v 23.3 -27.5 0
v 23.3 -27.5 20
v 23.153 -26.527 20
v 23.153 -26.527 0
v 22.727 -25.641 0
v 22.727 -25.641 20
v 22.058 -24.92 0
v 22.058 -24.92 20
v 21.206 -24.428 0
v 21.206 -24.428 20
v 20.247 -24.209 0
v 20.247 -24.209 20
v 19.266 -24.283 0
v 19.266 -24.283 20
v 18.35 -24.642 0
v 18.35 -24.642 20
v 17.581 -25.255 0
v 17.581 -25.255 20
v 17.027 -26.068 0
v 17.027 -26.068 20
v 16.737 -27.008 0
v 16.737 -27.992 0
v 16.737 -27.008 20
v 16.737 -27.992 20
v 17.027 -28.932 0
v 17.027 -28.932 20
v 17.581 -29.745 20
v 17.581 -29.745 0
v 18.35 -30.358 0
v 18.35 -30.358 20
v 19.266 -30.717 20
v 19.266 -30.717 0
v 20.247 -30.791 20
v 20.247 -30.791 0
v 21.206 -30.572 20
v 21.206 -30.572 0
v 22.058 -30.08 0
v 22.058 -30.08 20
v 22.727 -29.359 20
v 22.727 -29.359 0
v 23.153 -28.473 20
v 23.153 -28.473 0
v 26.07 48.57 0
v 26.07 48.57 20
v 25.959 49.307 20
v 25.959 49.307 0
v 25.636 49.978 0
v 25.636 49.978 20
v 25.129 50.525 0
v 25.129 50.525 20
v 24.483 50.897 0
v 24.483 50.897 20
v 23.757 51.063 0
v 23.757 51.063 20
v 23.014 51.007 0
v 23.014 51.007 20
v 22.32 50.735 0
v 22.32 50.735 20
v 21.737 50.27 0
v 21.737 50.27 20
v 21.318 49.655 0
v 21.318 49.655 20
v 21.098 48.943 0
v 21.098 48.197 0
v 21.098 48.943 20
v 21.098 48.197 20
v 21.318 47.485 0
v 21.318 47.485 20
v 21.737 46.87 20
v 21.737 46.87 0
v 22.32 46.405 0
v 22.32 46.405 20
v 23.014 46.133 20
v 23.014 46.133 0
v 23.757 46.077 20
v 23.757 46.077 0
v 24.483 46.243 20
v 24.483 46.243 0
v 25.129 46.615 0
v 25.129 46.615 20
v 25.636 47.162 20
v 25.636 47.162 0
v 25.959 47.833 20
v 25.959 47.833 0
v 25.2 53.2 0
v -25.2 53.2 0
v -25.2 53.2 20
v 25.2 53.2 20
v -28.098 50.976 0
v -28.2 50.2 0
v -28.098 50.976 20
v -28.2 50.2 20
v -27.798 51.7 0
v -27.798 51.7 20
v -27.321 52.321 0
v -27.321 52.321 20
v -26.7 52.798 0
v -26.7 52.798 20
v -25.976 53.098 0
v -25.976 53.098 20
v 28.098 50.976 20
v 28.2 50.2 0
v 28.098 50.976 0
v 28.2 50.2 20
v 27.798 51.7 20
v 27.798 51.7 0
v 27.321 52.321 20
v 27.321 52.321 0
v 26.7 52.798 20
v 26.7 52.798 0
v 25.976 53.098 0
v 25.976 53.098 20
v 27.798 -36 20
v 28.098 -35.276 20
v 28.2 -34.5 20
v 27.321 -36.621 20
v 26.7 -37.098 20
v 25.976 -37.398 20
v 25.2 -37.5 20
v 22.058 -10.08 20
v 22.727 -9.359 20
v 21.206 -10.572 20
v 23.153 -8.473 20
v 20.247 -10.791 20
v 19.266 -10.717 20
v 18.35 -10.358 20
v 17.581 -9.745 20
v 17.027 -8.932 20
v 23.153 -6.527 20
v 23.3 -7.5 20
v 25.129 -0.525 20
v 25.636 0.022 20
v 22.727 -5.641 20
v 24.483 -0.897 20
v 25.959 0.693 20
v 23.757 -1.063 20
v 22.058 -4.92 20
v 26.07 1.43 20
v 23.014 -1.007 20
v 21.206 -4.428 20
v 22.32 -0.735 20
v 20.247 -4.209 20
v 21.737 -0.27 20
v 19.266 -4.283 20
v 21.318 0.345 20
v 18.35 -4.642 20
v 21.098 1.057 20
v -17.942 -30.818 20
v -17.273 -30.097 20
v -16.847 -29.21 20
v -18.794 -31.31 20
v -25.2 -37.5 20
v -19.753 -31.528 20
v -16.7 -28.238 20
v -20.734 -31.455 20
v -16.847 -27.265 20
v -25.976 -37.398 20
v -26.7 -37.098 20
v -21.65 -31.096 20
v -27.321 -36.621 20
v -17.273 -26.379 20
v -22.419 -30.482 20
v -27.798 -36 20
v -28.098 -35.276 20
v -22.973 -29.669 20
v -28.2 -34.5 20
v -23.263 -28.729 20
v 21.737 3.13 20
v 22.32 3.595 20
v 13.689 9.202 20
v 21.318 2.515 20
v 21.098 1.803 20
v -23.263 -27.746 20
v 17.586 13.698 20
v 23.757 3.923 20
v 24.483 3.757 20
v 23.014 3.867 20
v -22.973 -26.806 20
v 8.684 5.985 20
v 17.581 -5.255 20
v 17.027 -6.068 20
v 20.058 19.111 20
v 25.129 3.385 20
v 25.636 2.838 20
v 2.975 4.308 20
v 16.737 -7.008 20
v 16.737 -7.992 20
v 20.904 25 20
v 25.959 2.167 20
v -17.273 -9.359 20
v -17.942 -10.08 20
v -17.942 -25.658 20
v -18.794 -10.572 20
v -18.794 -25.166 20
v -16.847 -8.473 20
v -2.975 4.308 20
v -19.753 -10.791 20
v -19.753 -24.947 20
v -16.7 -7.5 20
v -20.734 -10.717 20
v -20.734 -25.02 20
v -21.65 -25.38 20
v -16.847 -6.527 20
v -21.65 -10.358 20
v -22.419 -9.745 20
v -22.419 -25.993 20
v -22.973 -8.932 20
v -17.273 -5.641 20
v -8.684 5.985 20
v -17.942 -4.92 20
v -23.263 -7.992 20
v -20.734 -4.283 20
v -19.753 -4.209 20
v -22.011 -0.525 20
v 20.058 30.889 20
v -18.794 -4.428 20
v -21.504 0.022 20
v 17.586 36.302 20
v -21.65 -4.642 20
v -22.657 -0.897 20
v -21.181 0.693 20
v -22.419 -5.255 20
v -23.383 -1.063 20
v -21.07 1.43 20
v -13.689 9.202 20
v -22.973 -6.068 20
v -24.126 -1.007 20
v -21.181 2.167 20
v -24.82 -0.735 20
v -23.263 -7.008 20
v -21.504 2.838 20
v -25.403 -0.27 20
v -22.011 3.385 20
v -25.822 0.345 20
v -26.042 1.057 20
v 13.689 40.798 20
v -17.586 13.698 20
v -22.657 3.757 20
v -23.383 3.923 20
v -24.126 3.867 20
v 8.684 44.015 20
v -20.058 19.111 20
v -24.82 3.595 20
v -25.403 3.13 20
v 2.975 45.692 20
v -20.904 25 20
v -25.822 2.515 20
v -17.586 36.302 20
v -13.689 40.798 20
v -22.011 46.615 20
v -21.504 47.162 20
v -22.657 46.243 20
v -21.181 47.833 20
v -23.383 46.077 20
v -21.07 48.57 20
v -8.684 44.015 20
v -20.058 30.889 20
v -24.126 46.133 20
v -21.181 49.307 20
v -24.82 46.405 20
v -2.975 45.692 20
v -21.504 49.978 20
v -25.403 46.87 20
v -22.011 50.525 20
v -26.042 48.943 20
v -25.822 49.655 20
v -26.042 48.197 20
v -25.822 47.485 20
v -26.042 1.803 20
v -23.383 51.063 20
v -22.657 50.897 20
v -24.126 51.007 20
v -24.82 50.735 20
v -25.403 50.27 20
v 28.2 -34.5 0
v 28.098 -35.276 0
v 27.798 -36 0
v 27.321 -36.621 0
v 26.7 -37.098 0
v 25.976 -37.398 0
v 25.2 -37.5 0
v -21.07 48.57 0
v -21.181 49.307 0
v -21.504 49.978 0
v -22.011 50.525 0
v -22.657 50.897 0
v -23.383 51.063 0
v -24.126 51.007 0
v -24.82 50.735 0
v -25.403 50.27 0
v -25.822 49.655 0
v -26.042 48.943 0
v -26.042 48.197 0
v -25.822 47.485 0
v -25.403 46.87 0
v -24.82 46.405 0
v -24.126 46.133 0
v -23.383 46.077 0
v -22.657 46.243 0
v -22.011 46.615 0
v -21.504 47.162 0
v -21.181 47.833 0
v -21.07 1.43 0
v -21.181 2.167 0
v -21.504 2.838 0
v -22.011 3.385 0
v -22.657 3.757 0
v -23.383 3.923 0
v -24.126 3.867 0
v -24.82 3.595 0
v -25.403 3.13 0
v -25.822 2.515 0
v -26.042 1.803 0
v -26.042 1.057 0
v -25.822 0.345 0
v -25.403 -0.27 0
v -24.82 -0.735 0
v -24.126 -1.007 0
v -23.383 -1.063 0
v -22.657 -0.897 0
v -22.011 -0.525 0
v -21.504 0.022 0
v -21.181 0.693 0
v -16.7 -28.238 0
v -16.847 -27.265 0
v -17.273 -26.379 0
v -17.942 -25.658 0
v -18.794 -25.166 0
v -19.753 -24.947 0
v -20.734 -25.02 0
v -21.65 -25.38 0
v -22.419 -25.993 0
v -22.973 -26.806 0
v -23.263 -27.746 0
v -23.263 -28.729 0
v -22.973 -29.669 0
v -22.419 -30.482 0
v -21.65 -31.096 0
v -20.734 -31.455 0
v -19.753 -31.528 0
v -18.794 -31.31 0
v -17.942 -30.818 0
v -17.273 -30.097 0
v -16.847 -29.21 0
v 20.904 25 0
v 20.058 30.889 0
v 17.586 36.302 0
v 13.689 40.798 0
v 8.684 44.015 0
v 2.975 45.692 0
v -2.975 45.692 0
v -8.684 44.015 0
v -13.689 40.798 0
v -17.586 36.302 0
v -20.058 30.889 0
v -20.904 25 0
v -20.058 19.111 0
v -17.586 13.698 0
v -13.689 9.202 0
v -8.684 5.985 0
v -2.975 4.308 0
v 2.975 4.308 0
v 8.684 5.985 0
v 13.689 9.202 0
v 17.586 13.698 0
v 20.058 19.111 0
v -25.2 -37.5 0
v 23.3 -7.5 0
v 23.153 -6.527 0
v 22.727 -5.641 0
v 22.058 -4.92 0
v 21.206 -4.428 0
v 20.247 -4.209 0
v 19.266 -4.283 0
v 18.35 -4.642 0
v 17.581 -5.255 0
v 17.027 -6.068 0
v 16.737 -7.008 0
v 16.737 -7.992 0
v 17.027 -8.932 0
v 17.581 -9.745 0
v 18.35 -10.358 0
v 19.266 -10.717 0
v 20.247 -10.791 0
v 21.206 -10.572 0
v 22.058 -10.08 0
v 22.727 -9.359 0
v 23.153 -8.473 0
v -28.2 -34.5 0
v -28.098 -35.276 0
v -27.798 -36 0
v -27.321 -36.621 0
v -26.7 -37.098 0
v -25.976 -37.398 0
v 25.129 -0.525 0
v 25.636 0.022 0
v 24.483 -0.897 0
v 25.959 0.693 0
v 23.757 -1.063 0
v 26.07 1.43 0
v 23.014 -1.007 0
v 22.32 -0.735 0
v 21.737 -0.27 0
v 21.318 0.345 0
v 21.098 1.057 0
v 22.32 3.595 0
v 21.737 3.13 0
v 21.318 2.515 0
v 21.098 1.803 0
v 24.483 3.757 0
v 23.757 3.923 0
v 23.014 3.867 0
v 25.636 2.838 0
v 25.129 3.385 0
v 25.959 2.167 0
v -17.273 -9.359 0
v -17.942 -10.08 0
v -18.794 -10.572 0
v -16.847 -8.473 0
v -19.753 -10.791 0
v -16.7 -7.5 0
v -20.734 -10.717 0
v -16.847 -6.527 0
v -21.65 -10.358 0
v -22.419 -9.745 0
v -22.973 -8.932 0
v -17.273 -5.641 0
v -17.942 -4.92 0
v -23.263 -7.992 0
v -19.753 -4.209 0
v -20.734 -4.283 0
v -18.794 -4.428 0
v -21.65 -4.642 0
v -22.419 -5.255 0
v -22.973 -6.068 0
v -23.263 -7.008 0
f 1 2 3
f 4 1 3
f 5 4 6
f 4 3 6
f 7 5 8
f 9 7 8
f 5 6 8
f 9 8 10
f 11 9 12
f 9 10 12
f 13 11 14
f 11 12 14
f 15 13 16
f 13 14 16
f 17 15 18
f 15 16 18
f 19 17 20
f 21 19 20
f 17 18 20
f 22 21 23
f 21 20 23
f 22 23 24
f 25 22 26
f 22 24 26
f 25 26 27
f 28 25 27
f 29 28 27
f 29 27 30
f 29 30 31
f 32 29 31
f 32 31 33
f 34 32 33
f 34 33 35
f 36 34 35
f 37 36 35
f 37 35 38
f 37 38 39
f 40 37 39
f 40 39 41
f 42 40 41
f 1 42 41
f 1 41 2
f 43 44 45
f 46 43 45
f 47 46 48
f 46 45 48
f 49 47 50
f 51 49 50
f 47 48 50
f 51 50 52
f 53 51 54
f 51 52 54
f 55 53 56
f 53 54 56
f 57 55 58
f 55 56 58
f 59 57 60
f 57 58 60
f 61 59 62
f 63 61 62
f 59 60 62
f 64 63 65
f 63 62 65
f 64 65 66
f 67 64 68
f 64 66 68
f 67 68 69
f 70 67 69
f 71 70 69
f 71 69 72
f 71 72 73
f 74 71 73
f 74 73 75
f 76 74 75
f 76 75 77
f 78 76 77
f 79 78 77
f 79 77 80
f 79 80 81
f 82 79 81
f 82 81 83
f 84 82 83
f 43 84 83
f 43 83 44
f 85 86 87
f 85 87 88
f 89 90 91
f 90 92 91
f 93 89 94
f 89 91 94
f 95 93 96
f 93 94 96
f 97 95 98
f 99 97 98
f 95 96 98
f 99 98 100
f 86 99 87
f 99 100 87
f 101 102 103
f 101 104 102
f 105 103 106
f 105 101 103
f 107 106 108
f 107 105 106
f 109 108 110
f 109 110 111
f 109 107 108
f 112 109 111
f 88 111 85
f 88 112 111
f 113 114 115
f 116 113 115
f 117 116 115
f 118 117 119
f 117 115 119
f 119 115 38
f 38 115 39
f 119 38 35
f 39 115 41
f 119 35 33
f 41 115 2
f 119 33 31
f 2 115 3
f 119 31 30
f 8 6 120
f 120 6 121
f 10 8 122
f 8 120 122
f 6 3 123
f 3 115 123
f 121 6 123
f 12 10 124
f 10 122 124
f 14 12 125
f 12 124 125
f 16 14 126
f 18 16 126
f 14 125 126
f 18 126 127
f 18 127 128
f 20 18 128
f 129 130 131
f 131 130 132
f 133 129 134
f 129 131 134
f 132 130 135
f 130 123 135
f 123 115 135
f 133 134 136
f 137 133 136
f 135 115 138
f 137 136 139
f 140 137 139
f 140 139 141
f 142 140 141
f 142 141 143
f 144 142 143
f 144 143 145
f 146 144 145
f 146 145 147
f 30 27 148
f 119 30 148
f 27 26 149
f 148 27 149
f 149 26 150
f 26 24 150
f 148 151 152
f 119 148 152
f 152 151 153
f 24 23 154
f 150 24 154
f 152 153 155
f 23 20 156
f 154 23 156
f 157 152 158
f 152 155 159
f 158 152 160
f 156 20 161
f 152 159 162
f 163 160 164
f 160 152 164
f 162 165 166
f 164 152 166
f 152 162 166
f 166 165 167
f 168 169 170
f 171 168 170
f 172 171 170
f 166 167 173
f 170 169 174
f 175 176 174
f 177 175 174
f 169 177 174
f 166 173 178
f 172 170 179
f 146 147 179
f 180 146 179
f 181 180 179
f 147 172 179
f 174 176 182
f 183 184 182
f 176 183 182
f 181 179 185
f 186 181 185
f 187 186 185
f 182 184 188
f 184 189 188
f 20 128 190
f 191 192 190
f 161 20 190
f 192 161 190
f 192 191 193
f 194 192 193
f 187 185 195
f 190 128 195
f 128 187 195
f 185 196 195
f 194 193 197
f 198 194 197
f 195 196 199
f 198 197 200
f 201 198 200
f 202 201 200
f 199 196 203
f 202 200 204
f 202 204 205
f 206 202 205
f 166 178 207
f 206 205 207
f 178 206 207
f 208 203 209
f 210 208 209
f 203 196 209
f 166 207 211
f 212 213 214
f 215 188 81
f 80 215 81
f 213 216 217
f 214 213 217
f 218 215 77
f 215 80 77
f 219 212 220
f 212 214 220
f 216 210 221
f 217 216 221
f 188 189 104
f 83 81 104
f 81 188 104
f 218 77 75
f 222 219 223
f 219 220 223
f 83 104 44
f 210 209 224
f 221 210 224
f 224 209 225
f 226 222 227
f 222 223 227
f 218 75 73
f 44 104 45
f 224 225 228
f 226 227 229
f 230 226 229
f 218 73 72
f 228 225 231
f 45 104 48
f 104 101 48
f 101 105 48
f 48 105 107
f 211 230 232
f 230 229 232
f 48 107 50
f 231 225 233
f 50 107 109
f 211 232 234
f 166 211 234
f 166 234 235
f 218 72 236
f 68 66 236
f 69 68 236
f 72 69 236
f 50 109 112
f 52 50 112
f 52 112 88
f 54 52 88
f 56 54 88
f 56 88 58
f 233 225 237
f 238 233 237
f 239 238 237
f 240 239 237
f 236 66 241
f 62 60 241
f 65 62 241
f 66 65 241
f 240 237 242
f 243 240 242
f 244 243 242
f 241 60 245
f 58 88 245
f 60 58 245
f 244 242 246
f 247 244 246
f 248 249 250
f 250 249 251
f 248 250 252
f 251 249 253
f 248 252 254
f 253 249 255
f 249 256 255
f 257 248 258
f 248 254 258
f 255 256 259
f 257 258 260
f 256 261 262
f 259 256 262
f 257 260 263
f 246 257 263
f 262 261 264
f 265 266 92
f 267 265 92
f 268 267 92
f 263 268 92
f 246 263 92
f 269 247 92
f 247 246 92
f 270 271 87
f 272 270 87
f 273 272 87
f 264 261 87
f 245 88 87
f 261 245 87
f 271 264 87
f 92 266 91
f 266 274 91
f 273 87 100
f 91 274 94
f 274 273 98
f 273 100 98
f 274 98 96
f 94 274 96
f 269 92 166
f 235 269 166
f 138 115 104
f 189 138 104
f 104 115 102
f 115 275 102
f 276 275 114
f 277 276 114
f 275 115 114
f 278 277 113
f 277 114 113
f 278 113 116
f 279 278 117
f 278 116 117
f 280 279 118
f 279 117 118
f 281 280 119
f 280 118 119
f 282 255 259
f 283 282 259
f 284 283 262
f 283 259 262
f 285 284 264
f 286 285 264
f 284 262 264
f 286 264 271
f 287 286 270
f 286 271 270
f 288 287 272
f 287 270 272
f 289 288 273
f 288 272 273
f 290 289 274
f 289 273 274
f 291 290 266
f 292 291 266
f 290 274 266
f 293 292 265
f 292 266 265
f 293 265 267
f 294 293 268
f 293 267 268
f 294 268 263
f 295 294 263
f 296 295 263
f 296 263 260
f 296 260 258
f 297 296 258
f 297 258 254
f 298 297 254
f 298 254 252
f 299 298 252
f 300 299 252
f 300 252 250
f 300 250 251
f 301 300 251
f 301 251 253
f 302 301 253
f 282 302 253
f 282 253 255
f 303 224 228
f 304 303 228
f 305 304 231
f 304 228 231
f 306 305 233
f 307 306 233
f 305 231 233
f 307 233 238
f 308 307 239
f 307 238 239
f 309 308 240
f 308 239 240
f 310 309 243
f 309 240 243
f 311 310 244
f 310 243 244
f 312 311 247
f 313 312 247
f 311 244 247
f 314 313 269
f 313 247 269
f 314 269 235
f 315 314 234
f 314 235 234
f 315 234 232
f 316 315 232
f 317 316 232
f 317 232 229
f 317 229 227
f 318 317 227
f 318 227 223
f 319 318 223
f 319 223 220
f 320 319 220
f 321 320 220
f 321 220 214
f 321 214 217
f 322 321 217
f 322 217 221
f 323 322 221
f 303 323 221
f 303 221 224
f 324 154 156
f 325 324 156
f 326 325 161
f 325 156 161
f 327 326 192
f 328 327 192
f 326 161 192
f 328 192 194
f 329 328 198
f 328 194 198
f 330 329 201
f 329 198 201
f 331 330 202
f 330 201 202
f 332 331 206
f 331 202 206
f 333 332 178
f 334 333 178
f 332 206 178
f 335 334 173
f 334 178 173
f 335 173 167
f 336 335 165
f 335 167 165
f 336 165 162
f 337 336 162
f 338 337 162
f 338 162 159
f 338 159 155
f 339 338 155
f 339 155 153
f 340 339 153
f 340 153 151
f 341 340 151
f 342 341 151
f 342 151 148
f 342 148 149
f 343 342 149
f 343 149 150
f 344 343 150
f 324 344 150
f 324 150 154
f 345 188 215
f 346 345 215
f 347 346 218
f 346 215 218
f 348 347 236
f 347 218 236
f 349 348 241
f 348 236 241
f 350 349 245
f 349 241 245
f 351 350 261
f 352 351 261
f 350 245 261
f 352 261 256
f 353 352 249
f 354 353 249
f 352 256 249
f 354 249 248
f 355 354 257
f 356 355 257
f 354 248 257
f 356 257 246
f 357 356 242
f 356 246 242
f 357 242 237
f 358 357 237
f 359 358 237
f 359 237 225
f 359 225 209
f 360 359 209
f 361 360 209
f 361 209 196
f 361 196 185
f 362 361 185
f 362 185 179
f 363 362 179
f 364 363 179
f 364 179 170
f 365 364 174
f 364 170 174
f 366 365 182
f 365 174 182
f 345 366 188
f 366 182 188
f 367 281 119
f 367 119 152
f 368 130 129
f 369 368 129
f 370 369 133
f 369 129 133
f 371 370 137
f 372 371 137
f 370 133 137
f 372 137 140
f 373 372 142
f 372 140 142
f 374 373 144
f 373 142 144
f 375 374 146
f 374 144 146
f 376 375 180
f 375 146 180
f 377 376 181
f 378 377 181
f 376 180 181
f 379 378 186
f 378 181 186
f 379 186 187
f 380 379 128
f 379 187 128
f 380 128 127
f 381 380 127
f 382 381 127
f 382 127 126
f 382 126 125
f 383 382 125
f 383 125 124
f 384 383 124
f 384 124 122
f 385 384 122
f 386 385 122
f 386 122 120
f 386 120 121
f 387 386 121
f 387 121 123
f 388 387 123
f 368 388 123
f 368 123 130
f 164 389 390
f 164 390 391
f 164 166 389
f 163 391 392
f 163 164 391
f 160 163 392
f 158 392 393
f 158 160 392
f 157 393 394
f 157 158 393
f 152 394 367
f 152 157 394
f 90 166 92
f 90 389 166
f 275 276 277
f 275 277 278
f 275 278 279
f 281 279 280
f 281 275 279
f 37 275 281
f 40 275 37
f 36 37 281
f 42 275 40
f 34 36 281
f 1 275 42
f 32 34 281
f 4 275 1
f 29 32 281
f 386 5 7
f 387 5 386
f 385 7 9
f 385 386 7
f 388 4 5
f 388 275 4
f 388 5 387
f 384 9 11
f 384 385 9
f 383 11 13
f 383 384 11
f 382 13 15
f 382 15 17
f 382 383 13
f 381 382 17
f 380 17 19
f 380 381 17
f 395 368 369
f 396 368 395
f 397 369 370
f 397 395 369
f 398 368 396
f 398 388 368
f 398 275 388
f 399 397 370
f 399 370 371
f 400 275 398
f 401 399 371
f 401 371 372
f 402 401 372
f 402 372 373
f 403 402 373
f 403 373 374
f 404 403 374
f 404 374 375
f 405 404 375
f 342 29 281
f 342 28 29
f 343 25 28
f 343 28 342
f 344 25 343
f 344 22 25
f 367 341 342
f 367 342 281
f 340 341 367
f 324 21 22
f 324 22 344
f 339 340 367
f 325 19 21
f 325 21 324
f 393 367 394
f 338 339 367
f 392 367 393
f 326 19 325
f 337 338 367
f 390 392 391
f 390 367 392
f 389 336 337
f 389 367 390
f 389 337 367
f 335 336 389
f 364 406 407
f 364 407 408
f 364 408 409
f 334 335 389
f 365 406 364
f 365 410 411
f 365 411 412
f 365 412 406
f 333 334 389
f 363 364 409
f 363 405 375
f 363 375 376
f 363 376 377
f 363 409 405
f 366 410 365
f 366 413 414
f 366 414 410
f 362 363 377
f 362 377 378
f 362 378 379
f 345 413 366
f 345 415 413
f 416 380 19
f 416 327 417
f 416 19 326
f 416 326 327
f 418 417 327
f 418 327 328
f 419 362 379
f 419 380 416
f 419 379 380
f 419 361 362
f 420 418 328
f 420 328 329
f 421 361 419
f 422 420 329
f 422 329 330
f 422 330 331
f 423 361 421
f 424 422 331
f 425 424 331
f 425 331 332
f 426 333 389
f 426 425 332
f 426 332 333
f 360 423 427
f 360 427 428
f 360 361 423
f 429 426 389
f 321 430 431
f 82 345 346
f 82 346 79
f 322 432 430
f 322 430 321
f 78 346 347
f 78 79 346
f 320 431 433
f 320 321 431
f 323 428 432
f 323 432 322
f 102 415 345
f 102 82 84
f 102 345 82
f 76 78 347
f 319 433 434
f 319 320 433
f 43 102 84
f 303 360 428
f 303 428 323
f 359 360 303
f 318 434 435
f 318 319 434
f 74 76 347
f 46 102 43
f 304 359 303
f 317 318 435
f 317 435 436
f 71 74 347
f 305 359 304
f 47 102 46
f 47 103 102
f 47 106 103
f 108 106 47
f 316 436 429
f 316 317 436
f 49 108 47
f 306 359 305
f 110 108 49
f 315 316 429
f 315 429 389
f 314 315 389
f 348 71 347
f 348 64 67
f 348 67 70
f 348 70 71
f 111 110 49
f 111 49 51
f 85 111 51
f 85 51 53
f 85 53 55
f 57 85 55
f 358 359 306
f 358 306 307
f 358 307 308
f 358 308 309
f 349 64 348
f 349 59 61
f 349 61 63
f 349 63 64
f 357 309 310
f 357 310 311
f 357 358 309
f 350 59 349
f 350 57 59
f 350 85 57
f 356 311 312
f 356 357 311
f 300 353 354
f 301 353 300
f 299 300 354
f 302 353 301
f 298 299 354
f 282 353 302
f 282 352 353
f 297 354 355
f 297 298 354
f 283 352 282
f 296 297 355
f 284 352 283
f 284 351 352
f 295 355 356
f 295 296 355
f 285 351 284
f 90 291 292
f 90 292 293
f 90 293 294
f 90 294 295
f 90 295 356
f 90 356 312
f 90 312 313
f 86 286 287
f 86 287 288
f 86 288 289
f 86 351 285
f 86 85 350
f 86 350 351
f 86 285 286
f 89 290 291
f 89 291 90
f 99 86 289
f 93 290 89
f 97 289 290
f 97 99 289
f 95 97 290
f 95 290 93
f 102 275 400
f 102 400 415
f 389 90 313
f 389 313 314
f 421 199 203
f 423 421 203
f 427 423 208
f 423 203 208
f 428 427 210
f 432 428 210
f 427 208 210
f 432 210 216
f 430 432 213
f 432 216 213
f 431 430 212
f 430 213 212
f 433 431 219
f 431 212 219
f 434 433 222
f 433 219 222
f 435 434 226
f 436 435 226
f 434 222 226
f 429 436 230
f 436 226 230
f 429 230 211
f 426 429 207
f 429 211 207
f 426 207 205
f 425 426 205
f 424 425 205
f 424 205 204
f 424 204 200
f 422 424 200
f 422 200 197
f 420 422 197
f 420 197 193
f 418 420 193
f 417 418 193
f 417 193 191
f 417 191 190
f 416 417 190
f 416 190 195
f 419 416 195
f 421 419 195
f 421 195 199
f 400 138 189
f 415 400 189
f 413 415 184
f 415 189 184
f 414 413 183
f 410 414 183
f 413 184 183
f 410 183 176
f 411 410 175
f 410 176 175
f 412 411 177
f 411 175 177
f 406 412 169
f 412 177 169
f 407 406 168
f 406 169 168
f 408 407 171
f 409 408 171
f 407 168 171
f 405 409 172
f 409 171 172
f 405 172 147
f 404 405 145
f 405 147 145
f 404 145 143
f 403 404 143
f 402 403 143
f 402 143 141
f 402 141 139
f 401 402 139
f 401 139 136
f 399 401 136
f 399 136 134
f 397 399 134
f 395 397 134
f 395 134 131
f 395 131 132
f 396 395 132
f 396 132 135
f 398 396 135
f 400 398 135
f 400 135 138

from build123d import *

# Parameters (mm, degrees)
SKETCH1_W               = 56.4
SKETCH1_H               = 56.4
BOSS_EXTRUDE1_DEPTH     = 20
SKETCH2_R               = 20.904355549
CUT_EXTRUDE2_DEPTH      = 20
SKETCH3_W               = 56.4
SKETCH3_H               = 34.3
BOSS_EXTRUDE2_DEPTH     = 20
FILLET1_R               = 3
TAP_DRILL_FOR_M6_TAP1_D = 5
M6_CLEARANCE_HOLE1_D    = 6.6


with BuildPart() as part:
    # Sketch1 → Boss-Extrude1 (new body)
    with BuildSketch(Plane.XY):
        with Locations((0, 25)):
            Rectangle(SKETCH1_W, SKETCH1_H)
    extrude(amount=BOSS_EXTRUDE1_DEPTH)

    # Sketch2 → Cut-Extrude2 (cut)
    with BuildSketch(Plane.XY.offset(20)):
        with Locations((0, 25)):
            Circle(SKETCH2_R)
    extrude(amount=-CUT_EXTRUDE2_DEPTH, mode=Mode.SUBTRACT)

    # Sketch3 → Boss-Extrude2 (add)
    with BuildSketch(Plane(origin=(0, 0, 0), x_dir=(-1, 0, 0), z_dir=(0, 0, -1))):
        with Locations((0, -20.35)):
            Rectangle(SKETCH3_W, SKETCH3_H)
    extrude(amount=-BOSS_EXTRUDE2_DEPTH)

    # Fillet1
    fillet1_edges = [part.edges().sort_by_distance(p)[0] for p in [
        (28.2, -37.5, 10),
        (-28.2, -37.5, 10),
        (28.2, 53.2, 10),
        (-28.2, 53.2, 10),
    ]]
    fillet(fillet1_edges, radius=FILLET1_R)

    # Tap Drill for M6 Tap1 (through all)
    with Locations(Plane(origin=(0, 0, 0), x_dir=(-1, 0, 0), z_dir=(0, 0, -1))):
        with Locations((-23.57, 48.57), (23.57, 48.57), (-23.57, 1.43), (23.57, 1.43)):
            Hole(TAP_DRILL_FOR_M6_TAP1_D / 2)

    # M6 Clearance Hole1 (through all)
    with Locations(Plane(origin=(0, 0, 0), x_dir=(-1, 0, 0), z_dir=(0, 0, -1))):
        with Locations((-20, -7.5), (-20, -27.5), (20, -28.237657735), (20, -7.5)):
            Hole(M6_CLEARANCE_HOLE1_D / 2)


solid = part.part
